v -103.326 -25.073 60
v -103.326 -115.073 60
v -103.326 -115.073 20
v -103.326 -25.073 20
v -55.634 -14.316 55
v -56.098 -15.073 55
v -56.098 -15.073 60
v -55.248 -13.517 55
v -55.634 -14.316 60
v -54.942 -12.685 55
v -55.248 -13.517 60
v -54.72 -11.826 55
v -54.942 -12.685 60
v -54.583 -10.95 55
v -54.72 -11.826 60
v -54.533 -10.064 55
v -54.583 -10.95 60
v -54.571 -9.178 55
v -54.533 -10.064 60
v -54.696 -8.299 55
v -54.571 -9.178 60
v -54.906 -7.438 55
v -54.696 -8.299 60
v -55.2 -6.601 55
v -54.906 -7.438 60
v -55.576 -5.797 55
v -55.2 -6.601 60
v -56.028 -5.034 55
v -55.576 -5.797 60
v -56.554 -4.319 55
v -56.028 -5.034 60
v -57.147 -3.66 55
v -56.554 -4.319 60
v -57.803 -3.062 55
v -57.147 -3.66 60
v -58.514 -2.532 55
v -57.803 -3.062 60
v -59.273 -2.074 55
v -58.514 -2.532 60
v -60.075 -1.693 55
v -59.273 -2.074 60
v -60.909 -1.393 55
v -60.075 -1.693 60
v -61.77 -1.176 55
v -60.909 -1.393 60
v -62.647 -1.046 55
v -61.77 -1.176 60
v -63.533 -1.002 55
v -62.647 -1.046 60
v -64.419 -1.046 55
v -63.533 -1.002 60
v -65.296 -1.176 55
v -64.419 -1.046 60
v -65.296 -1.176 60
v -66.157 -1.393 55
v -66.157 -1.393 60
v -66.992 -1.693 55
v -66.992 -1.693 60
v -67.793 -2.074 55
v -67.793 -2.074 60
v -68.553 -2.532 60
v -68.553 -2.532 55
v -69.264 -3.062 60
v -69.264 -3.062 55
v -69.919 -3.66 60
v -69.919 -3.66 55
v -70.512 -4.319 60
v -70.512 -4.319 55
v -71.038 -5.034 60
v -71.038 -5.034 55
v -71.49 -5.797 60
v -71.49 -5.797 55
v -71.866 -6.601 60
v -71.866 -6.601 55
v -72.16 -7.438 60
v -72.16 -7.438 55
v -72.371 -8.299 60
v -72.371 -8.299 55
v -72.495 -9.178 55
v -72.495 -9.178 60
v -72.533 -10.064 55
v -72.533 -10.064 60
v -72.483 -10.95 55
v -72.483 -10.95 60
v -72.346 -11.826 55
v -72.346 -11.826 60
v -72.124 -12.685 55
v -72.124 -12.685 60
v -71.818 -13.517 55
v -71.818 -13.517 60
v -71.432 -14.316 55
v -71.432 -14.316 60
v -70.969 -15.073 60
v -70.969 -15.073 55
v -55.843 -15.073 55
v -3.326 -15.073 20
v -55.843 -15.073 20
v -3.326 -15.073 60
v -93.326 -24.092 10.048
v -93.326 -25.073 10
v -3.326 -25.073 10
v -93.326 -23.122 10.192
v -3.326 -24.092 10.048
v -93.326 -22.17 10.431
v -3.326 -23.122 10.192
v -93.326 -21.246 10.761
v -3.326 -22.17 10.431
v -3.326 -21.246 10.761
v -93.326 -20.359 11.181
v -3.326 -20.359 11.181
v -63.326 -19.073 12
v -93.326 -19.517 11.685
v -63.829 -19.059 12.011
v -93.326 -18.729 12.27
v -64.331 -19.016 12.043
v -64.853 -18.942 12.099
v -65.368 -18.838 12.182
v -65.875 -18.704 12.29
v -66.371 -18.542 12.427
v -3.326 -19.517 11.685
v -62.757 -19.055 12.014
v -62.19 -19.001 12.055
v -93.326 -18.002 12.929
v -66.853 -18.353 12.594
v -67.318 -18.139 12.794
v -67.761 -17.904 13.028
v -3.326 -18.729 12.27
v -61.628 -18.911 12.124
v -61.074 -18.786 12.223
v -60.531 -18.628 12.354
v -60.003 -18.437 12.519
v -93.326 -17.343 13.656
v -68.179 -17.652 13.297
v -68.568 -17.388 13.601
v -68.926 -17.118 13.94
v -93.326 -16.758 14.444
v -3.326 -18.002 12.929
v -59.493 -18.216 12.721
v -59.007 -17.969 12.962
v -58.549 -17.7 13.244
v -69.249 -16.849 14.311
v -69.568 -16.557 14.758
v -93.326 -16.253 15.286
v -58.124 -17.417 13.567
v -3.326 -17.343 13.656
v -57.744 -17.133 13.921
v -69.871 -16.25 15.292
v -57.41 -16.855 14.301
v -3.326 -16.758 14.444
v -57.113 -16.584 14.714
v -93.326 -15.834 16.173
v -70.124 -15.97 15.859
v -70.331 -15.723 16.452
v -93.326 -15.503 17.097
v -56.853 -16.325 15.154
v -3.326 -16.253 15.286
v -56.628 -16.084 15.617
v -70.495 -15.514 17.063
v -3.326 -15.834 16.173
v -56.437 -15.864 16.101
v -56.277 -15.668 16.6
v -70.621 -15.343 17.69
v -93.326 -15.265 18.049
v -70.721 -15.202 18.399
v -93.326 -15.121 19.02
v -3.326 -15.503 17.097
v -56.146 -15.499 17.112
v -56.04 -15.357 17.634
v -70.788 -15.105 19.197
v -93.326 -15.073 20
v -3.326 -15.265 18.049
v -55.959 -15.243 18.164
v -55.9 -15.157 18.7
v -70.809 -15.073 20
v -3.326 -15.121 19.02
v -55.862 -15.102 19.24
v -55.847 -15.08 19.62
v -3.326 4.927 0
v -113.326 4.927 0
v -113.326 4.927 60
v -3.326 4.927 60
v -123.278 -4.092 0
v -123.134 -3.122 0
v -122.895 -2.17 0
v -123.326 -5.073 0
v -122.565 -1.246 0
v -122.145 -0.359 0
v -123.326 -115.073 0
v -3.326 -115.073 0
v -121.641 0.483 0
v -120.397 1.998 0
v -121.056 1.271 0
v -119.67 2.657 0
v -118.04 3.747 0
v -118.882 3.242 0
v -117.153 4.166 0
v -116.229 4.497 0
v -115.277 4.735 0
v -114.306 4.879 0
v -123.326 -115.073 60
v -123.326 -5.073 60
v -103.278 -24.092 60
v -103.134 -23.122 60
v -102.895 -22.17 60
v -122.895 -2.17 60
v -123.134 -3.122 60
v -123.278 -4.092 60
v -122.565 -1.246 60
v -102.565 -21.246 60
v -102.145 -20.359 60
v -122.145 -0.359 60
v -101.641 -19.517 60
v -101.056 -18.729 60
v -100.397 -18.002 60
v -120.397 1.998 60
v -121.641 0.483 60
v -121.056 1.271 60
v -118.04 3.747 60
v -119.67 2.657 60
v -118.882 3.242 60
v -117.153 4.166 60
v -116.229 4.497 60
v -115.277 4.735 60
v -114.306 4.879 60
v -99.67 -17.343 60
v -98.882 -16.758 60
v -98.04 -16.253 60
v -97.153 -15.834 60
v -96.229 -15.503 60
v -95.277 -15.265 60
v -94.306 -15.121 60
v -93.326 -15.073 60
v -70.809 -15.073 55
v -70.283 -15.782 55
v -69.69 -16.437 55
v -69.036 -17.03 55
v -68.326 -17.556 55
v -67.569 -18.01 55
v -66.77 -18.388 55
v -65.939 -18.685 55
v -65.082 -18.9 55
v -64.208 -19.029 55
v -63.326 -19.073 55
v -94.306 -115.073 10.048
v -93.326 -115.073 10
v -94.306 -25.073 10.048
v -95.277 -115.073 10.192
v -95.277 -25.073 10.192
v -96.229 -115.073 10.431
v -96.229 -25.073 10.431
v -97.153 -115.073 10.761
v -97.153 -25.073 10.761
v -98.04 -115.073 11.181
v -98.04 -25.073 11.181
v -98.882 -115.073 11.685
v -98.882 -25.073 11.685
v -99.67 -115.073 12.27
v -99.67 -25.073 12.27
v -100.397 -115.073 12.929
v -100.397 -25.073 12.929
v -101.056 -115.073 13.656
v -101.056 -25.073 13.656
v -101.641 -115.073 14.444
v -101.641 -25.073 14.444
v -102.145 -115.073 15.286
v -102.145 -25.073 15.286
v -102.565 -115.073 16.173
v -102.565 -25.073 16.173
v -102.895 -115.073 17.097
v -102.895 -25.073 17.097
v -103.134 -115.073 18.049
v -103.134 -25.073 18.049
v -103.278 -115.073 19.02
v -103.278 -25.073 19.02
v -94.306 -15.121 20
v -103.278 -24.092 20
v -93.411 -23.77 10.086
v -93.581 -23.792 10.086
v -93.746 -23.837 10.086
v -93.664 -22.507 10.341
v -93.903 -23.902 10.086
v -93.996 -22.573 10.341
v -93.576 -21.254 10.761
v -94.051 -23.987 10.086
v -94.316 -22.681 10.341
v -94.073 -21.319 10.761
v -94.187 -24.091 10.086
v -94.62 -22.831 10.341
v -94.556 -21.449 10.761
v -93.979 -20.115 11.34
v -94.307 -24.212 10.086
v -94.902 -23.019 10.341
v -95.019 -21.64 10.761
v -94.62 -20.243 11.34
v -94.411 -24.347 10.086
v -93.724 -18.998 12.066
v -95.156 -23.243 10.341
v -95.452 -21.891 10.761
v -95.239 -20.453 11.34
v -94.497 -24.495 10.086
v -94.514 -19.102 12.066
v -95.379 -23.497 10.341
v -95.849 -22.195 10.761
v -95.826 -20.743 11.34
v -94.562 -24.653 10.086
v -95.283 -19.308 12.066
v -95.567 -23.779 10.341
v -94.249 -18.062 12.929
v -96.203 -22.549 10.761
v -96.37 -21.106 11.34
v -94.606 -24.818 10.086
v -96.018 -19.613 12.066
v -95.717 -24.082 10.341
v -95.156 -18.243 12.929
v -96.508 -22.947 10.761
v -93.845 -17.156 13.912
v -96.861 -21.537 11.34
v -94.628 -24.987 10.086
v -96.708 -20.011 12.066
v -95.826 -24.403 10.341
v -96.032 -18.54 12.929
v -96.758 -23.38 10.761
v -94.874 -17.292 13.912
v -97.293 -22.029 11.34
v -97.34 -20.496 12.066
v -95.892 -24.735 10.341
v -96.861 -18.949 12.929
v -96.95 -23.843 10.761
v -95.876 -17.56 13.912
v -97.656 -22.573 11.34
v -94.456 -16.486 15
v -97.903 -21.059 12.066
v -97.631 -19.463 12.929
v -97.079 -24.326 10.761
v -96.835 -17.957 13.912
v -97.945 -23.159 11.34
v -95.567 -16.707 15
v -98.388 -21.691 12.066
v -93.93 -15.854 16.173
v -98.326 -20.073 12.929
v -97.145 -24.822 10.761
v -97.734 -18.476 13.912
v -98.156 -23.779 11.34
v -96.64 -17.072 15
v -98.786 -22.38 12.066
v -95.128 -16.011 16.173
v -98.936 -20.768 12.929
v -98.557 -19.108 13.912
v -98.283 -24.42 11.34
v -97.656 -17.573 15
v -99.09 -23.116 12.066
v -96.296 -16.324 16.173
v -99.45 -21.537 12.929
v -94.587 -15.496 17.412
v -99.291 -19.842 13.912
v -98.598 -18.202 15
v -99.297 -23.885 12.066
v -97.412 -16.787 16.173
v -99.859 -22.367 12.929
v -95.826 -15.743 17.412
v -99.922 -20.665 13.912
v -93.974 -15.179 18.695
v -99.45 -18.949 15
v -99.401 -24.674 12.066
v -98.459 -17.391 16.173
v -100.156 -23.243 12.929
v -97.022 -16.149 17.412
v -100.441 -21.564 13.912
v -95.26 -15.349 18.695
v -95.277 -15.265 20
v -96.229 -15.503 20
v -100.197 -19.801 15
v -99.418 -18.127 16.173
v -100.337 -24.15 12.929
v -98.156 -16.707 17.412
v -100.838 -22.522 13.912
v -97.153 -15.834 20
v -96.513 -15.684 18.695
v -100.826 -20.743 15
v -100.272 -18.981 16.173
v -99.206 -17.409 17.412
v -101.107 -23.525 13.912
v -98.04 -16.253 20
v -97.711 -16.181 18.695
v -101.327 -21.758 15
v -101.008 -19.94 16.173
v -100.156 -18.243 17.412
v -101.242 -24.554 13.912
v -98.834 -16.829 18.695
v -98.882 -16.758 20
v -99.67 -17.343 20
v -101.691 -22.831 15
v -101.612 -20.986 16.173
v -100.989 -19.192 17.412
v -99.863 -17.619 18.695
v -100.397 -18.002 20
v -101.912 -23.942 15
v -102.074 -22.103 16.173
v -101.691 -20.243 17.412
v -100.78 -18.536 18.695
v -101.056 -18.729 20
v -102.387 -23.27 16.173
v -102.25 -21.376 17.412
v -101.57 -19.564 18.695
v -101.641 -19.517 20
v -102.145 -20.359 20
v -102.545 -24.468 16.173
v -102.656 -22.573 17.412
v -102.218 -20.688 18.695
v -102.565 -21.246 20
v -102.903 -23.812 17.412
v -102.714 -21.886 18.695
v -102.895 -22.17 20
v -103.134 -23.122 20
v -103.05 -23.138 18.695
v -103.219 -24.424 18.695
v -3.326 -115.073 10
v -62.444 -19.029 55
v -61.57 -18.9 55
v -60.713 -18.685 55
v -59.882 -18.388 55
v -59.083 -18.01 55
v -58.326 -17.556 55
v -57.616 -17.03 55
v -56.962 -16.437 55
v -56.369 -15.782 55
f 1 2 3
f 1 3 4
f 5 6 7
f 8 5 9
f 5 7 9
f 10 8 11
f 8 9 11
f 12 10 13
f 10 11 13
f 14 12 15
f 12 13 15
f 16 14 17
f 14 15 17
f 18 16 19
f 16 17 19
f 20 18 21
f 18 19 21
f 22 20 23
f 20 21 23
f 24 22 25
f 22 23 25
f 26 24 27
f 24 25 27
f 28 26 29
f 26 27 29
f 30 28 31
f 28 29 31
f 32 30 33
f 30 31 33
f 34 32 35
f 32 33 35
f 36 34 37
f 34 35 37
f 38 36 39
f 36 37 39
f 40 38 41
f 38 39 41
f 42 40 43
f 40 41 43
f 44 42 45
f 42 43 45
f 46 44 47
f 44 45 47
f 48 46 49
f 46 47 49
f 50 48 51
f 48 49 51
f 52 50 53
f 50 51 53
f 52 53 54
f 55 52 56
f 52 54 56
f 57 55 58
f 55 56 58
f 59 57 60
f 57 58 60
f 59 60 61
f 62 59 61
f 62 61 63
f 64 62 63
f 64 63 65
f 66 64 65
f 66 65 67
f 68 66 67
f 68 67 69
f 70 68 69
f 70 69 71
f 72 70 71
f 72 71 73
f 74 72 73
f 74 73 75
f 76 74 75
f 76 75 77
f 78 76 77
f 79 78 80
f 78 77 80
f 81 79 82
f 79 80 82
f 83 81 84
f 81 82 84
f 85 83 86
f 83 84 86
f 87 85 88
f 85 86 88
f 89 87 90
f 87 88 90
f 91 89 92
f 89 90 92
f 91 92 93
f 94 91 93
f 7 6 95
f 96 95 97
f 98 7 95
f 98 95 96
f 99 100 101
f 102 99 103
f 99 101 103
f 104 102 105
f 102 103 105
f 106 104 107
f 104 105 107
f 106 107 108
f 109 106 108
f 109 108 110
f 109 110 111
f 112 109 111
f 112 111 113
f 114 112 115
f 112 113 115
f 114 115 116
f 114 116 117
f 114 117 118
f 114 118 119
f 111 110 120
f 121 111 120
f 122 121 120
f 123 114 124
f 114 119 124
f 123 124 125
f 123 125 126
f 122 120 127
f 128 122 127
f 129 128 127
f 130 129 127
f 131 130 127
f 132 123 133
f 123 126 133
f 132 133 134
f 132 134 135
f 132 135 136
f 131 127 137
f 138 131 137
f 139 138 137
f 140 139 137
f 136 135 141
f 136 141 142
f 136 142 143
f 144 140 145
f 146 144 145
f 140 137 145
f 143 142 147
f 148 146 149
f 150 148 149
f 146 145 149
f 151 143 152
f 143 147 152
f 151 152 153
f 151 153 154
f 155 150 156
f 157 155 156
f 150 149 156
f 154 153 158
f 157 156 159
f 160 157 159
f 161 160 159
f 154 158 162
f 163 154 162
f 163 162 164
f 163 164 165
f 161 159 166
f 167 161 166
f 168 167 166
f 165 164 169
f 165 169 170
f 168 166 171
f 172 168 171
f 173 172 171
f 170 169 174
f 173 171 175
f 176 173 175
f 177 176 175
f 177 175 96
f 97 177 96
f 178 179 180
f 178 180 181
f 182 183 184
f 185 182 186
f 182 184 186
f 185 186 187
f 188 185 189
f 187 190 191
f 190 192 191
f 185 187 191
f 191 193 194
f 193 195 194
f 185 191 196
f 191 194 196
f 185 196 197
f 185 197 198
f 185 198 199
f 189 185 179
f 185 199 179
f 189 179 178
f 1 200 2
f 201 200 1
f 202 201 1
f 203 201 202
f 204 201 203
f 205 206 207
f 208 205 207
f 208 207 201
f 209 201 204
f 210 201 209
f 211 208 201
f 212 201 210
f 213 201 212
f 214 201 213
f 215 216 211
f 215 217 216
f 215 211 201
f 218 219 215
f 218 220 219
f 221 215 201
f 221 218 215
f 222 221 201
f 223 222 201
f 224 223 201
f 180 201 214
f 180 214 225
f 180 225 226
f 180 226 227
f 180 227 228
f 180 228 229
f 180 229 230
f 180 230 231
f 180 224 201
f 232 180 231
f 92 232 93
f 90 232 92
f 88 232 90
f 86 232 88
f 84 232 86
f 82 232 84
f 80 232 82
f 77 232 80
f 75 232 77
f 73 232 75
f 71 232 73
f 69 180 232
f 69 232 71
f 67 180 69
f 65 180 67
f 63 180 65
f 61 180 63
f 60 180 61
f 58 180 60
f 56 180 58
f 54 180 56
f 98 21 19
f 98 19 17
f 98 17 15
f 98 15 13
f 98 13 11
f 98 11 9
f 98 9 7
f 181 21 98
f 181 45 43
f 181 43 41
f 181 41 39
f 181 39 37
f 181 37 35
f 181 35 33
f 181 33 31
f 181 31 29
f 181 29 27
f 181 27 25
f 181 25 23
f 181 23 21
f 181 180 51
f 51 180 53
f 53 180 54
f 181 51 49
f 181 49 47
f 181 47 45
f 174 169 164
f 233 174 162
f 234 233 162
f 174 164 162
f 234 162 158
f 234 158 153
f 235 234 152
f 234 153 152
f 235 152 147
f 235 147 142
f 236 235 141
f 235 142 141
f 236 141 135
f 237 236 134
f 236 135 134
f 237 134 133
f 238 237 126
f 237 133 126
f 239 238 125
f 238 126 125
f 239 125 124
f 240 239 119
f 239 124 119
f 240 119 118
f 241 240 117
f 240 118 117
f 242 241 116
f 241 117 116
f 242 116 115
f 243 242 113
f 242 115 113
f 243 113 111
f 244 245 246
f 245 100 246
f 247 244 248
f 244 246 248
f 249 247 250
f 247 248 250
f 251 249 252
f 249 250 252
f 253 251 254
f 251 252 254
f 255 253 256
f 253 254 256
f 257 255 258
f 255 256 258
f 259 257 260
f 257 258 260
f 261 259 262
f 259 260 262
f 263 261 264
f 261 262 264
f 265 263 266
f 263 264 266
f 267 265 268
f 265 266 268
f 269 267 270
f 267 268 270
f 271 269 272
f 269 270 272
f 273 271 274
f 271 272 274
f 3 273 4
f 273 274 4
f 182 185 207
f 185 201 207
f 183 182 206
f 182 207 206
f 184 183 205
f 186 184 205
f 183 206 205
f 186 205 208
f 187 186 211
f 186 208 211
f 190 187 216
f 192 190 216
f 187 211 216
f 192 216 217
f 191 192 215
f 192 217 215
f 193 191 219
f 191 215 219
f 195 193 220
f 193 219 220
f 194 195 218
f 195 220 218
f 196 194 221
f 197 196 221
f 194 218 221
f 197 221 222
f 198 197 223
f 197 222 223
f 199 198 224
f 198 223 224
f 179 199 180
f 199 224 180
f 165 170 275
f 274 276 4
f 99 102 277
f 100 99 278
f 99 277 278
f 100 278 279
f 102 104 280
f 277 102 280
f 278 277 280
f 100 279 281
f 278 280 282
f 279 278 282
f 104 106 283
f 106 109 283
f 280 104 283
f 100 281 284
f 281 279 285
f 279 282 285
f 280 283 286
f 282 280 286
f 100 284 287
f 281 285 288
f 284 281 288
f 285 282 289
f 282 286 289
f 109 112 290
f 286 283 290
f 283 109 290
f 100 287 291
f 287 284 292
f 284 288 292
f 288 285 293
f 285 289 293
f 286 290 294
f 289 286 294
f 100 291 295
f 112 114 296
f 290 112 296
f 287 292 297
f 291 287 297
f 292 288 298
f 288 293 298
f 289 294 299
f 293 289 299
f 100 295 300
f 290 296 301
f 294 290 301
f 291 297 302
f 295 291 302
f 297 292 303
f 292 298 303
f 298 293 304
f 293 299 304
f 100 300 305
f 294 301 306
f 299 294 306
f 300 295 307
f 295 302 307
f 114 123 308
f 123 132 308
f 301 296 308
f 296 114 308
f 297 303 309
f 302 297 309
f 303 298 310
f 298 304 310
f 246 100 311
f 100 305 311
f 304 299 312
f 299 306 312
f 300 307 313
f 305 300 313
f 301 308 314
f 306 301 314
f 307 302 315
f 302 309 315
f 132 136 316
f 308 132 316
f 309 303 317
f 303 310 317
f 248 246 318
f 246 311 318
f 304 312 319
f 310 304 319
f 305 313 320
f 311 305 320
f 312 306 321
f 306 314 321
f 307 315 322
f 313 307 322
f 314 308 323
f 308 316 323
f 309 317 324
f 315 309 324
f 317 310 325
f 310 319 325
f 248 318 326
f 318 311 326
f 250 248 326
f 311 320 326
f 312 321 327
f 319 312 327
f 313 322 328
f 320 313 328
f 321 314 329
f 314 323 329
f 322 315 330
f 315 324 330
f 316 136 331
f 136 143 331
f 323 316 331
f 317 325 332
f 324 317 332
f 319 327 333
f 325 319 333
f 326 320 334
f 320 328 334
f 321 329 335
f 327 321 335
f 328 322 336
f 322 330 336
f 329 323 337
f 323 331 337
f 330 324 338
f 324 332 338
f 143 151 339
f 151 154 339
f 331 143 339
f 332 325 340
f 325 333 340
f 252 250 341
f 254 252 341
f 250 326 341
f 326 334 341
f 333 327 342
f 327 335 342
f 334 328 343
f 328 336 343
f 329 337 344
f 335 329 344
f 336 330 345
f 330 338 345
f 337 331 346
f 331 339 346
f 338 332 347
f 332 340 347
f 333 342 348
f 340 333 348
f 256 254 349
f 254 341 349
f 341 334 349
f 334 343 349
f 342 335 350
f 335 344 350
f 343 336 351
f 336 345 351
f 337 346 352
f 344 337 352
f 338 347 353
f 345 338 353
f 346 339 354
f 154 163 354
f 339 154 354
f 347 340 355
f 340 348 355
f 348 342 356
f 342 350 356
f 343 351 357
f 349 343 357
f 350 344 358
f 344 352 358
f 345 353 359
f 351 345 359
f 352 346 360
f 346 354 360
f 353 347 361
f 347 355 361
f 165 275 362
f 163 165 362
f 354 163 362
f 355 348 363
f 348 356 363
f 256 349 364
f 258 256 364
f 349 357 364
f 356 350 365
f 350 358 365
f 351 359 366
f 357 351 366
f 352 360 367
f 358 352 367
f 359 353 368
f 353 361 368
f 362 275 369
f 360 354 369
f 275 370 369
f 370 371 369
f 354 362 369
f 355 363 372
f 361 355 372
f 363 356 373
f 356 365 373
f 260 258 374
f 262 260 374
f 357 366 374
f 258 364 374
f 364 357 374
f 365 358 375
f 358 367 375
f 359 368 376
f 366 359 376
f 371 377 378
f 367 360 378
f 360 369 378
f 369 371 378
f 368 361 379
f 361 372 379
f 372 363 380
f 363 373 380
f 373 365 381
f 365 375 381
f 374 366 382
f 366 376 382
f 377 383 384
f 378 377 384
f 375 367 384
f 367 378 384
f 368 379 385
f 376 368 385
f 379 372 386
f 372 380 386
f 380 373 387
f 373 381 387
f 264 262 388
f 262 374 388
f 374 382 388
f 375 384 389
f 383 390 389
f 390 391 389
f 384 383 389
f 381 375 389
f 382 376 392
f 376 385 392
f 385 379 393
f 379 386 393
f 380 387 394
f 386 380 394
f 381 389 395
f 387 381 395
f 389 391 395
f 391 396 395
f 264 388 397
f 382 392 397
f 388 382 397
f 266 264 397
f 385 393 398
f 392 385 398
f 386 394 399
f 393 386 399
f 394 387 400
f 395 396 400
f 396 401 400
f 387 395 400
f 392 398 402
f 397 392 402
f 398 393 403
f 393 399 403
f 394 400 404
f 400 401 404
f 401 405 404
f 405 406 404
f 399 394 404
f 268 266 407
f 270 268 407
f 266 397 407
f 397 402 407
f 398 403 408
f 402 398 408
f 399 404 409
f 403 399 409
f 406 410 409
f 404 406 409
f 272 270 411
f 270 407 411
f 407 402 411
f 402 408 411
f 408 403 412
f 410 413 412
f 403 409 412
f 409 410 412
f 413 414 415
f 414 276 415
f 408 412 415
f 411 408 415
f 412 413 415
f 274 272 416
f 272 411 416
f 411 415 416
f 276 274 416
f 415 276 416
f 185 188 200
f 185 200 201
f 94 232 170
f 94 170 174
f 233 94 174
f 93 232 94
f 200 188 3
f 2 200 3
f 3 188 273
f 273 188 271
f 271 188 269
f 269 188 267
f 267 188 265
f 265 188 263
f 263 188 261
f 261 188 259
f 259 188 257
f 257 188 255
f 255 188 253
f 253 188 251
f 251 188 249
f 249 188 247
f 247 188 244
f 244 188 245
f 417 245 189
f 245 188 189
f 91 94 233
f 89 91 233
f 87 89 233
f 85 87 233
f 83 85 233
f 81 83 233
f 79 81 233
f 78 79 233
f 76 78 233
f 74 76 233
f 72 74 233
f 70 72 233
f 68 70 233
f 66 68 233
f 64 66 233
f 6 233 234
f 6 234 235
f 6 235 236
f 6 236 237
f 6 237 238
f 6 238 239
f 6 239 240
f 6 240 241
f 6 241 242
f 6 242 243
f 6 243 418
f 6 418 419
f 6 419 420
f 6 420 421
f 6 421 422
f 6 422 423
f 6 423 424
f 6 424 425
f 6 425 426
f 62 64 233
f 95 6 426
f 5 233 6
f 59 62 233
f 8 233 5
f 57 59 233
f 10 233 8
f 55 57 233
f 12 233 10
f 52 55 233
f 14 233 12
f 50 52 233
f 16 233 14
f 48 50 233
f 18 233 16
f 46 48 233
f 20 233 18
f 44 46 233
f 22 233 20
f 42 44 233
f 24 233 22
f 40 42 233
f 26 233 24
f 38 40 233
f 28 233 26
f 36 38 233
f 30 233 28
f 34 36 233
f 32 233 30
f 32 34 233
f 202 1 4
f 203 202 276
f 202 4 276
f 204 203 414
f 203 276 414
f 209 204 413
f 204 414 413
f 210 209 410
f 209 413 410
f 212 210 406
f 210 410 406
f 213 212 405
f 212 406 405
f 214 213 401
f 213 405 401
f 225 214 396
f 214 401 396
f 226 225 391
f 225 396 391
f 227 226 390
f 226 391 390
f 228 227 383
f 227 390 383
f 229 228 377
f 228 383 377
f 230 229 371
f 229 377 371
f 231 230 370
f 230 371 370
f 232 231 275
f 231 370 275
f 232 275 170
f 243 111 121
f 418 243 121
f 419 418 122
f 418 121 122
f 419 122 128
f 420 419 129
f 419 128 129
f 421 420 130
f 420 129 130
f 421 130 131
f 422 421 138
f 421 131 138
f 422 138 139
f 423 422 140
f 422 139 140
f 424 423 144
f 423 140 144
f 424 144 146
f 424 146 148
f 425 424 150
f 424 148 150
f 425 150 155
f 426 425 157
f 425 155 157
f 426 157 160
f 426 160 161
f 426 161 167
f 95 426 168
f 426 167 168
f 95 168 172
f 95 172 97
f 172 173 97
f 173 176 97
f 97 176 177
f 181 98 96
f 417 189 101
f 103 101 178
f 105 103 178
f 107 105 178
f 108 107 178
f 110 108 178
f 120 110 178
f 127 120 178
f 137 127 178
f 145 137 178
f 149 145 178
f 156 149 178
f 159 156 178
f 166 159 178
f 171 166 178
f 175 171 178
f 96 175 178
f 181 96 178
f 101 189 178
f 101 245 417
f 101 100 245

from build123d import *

# Parameters (mm, degrees)
F0_W     = 120
F0_H     = 120
F1_DEPTH = 60
F2_W     = 100
F2_H     = 100
F3_DEPTH = 50
F4_R     = 10
F5_R     = 9
F6_DEPTH = 5
F7_R     = 10
F9_DEPTH = 45


with BuildPart() as f1:
    # F0 (on Top) → F1 (new body)
    with BuildSketch(Plane.XY):
        with Locations((-63.325952, -55.072633)):
            Rectangle(F0_W, F0_H)
    extrude(amount=F1_DEPTH)

    # F2 (on face) → F3 (cut)
    with BuildSketch(Plane.XY.offset(60)):
        with Locations((-53.325952, -65.072633)):
            Rectangle(F2_W, F2_H)
    extrude(amount=-F3_DEPTH, mode=Mode.SUBTRACT)

    # F4
    f4_edges = [f1.edges().sort_by_distance(p)[0] for p in [
        (-103.325952, -15.072633, 35),
        (-53.325952, -15.072633, 10),
        (-103.325952, -65.072633, 10),
    ]]
    fillet(f4_edges, radius=F4_R)

    # F5 (on face) → F6 (cut)
    with BuildSketch(Plane.XY.offset(60)):
        with Locations((-63.533046, -10.001782)):
            Circle(F5_R)
    extrude(amount=-F6_DEPTH, mode=Mode.SUBTRACT)

    # F7
    f7_edges = [f1.edges().sort_by_distance(p)[0] for p in [
        (-123.325952, 4.927367, 30),
    ]]
    fillet(f7_edges, radius=F7_R)

    # F8 (on face) → F9 (join)
    with BuildSketch(Plane.XY.offset(10)):
        with BuildLine():
            ThreePointArc((-63.325952, -1.072633), (-72.325952, -10.072633), (-63.325952, -19.072633))
            Line((-63.325952, -19.072633), (-63.325952, -1.072633))
        make_face()
        with BuildLine():
            Line((-63.325952, -1.072633), (-63.325952, -19.072633))
            ThreePointArc((-63.325952, -19.072633), (-56.96199, -16.436594), (-54.325952, -10.072633))
            ThreePointArc((-54.325952, -10.072633), (-56.96199, -3.708672), (-63.325952, -1.072633))
        make_face()
    extrude(amount=F9_DEPTH)


solid = f1.part
